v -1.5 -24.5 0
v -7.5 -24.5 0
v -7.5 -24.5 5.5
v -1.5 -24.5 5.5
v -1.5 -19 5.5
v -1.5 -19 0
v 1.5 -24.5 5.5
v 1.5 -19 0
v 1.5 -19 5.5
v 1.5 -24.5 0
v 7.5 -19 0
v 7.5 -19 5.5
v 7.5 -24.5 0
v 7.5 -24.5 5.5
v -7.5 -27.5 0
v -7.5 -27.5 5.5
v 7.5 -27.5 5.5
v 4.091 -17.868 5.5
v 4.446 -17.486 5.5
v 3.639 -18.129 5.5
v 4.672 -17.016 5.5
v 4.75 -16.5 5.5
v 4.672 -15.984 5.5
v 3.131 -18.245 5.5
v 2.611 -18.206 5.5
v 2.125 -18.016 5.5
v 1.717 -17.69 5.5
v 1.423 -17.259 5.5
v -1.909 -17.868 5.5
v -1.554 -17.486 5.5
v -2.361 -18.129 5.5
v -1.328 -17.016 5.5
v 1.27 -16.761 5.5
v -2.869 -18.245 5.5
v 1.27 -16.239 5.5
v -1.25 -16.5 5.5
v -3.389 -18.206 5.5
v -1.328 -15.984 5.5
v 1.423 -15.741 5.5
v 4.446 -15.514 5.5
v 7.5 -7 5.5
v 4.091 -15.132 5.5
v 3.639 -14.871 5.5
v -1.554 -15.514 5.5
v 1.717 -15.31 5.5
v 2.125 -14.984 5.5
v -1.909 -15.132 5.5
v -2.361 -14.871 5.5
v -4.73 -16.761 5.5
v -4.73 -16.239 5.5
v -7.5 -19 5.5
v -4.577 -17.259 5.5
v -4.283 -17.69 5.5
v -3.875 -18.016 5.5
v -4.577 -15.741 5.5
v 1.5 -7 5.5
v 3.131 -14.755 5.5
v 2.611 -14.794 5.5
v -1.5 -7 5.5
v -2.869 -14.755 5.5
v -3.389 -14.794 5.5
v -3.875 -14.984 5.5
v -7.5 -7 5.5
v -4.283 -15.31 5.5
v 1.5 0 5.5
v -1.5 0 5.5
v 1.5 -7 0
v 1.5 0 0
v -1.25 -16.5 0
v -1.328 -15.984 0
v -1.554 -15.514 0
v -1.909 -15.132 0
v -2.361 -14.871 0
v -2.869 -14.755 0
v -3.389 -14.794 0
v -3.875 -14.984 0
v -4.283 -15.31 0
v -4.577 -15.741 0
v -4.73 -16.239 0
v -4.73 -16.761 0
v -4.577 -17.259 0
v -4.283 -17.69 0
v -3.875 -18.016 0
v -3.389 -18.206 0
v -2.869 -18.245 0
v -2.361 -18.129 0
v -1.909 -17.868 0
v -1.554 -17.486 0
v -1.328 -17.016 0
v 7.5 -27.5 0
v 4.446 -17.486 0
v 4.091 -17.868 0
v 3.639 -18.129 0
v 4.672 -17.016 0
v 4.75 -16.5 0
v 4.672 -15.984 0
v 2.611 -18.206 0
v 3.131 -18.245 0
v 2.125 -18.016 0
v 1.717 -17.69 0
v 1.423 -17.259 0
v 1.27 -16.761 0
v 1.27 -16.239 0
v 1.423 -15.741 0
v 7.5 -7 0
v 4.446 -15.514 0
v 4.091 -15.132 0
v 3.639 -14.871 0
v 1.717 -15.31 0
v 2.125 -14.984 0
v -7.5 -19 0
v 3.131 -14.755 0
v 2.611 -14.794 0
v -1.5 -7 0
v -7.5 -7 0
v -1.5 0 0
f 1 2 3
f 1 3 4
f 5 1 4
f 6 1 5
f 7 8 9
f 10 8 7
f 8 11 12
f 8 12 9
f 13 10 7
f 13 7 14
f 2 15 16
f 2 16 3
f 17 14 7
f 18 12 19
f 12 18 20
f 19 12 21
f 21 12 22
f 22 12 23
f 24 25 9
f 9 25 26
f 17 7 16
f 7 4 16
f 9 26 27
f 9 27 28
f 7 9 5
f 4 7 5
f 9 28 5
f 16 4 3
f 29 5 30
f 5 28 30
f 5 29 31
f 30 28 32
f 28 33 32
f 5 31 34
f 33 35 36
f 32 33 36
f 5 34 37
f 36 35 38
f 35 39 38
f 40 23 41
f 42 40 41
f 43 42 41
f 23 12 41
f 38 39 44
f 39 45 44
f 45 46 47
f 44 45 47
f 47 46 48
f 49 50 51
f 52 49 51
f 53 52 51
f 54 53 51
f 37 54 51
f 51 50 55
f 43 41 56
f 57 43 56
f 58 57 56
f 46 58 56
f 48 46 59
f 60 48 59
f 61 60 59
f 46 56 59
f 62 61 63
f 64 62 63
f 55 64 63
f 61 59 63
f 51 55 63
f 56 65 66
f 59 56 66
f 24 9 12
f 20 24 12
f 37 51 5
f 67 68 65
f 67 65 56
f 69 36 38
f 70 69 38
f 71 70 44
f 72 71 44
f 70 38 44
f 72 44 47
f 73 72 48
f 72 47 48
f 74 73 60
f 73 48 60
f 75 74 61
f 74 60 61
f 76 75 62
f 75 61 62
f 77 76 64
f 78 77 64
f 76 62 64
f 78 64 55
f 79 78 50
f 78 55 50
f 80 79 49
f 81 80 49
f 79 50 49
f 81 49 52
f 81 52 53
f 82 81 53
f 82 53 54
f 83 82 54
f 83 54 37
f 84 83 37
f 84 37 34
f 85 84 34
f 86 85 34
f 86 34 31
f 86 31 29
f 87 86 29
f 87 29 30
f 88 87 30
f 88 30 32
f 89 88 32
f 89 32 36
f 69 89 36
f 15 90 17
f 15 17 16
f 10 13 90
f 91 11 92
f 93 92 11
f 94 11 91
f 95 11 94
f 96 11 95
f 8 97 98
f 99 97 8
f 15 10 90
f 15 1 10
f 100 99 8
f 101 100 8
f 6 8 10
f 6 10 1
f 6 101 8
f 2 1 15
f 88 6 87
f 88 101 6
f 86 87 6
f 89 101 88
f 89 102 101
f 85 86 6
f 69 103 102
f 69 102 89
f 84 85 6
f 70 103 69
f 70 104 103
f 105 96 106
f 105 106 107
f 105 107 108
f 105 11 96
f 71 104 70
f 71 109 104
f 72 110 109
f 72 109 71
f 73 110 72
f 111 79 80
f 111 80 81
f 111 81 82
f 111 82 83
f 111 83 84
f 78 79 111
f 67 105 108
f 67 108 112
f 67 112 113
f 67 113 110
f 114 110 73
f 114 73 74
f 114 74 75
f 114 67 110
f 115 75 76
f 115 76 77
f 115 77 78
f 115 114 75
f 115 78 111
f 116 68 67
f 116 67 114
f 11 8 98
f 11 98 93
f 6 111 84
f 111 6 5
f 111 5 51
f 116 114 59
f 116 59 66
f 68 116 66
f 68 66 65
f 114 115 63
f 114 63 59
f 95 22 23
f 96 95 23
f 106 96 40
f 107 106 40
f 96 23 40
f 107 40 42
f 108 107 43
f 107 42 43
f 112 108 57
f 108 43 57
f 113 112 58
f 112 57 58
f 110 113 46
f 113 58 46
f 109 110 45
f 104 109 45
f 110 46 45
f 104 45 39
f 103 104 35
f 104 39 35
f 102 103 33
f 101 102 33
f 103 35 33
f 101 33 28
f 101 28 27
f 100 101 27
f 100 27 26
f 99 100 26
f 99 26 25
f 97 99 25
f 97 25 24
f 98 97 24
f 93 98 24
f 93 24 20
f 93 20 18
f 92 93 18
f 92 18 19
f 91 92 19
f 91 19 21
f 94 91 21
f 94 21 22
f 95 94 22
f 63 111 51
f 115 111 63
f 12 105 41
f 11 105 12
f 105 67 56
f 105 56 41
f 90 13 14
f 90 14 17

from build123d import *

# Parameters (mm, degrees)
EXTRUDE_1_DEPTH     = 5.5
SKETCH_2_R          = 1.75
CUT_EXTRUDE_1_DEPTH = 30.030156734


with BuildPart() as part:
    # ｽｹｯﾁ1 → ﾎﾞｽ - 押し出し1 (new body)
    with BuildSketch(Plane.XY):
        Polygon((1.5, -7), (7.5, -7), (7.5, -19), (1.5, -19), (1.5, -24.5), (7.5, -24.5), (7.5, -27.5), (-7.5, -27.5), (-7.5, -24.5), (-1.5, -24.5), (-1.5, -19), (-7.5, -19), (-7.5, -7), (-1.5, -7), (-1.5, 0), (1.5, 0), align=None)
    extrude(amount=EXTRUDE_1_DEPTH)

    # ｽｹｯﾁ2 → ｶｯﾄ - 押し出し1 (cut, through all)
    with BuildSketch(Plane.XY.offset(5.5)):
        with Locations((-3, -16.5)):
            Circle(SKETCH_2_R)
        with Locations((3, -16.5)):
            Circle(SKETCH_2_R)
    extrude(amount=-CUT_EXTRUDE_1_DEPTH, mode=Mode.SUBTRACT)


solid = part.part
